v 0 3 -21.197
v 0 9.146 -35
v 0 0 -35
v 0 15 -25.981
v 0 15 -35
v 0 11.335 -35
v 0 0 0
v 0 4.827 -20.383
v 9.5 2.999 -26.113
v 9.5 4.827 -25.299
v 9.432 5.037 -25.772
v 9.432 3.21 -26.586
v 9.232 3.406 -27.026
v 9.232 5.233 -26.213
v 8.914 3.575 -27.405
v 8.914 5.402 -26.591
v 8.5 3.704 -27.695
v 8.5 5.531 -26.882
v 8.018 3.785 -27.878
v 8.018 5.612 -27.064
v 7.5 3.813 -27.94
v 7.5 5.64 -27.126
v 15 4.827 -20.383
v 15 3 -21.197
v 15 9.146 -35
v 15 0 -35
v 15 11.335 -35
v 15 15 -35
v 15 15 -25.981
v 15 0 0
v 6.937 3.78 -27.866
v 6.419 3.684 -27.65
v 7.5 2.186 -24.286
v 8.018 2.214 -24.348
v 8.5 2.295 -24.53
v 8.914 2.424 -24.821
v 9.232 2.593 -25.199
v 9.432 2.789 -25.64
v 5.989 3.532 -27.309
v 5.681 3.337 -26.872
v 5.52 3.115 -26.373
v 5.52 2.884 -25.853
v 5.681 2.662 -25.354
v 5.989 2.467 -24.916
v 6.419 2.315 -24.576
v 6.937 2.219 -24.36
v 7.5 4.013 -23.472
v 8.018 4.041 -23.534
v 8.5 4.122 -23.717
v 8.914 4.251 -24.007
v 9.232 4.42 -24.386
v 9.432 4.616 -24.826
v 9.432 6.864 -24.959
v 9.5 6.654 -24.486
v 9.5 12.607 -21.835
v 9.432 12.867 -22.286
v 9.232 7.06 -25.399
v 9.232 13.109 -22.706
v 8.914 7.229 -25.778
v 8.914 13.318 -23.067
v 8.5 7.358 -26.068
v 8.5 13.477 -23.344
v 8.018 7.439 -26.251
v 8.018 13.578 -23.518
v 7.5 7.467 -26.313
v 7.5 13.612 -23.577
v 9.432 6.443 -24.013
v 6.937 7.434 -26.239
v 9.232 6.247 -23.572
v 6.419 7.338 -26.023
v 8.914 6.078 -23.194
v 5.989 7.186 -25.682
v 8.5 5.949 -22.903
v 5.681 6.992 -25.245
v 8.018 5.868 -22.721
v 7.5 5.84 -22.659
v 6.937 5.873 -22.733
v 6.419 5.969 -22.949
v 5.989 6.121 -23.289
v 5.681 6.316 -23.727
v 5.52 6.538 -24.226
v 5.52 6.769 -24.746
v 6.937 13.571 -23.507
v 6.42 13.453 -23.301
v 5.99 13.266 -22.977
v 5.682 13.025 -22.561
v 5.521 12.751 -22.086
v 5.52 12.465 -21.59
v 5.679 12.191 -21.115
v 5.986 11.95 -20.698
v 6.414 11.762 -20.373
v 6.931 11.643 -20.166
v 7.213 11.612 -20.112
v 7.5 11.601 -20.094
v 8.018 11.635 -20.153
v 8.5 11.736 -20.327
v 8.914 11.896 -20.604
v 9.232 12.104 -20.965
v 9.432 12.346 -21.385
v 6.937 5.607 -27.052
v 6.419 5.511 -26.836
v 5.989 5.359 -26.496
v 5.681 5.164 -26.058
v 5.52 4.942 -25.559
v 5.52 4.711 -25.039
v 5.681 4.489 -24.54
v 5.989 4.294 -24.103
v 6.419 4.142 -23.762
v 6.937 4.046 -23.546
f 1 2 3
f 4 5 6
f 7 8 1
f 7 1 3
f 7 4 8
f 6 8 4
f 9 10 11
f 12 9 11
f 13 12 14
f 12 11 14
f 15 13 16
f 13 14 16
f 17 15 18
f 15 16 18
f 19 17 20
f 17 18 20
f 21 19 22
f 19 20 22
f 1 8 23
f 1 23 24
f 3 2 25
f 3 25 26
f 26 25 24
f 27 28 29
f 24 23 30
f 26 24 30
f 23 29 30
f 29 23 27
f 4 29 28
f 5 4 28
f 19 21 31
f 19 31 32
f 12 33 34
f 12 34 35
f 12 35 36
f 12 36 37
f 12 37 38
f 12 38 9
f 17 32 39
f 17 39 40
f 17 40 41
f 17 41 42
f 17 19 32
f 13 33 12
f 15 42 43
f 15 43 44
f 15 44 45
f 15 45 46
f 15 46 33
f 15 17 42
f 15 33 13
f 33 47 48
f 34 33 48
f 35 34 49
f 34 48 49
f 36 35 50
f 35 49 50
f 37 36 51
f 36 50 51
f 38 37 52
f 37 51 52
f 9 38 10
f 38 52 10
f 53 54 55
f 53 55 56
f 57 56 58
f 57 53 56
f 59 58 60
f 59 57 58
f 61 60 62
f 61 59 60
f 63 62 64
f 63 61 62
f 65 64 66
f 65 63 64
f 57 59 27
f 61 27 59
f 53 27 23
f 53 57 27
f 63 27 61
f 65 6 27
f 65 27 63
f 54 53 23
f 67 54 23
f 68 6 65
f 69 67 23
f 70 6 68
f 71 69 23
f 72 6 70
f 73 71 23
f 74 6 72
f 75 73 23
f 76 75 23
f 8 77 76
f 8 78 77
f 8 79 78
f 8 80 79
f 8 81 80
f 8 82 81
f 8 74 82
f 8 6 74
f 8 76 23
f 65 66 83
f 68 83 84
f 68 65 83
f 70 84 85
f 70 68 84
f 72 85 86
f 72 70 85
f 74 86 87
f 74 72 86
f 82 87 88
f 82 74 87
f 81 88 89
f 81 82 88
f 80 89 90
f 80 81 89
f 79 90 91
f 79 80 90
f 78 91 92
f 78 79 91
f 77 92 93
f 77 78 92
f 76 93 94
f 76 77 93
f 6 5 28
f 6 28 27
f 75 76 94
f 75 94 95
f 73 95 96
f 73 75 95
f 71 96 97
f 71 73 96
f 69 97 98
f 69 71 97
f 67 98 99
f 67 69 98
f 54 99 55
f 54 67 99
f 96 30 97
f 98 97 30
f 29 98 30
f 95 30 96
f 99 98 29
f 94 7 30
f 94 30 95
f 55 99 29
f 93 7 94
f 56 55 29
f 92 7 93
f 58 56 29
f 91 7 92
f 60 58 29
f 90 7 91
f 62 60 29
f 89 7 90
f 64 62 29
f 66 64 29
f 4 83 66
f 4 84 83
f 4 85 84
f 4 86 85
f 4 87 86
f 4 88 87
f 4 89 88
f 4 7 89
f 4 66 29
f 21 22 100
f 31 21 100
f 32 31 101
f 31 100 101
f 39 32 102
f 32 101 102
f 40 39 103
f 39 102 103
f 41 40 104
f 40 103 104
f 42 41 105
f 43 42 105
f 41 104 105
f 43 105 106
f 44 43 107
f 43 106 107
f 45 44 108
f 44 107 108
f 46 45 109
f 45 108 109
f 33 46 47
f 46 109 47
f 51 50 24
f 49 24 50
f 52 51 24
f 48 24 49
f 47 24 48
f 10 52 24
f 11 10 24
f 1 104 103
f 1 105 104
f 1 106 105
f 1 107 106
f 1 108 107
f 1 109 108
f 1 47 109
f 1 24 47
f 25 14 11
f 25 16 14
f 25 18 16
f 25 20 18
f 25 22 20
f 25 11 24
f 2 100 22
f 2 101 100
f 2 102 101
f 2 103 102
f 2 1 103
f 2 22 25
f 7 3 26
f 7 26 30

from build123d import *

# Parameters (mm, degrees)
BOSS_EXTRUDE2_DEPTH     = 15
CUT_EXTRUDE5_DEPTH      = 11
CUT_EXTRUDE5_DEPTH_BACK = 2


with BuildPart() as part:
    # Sketch3 → Boss-Extrude2 (new body)
    with BuildSketch(Plane(origin=(0, 0, 0), x_dir=(0, 0, -1), z_dir=(1, 0, 0))):
        Polygon((0, 0), (25.980762114, 15), (35, 15), (35, 11.334877204), (20.383272678, 4.827090915), (21.196745964, 3), (35, 9.145604647), (35, 0), align=None)
    extrude(amount=BOSS_EXTRUDE2_DEPTH)

    # Sketch7 → Cut-Extrude5 (cut, two sides)
    with BuildSketch(Plane(origin=(0, -5.37243013, -2.391960004), x_dir=(1, 0, 0), z_dir=(0, 0.913545458, 0.406736643))) as cut_extrude5_sk:
        with BuildLine():
            ThreePointArc((9.5, 25.075140664), (8.914213562, 26.489354226), (7.5, 27.075140664))
            Line((7.5, 27.075140664), (7.5, 23.075140664))
            ThreePointArc((7.5, 23.075140664), (8.914213562, 23.660927101), (9.5, 25.075140664))
        make_face()
        with BuildLine():
            Line((7.5, 23.075140664), (7.5, 27.075140664))
            ThreePointArc((7.5, 27.075140664), (5.5, 25.075140664), (7.5, 23.075140664))
        make_face()
    extrude(amount=CUT_EXTRUDE5_DEPTH, mode=Mode.SUBTRACT)
    extrude(cut_extrude5_sk.sketch, amount=-CUT_EXTRUDE5_DEPTH_BACK, mode=Mode.SUBTRACT)


solid = part.part
